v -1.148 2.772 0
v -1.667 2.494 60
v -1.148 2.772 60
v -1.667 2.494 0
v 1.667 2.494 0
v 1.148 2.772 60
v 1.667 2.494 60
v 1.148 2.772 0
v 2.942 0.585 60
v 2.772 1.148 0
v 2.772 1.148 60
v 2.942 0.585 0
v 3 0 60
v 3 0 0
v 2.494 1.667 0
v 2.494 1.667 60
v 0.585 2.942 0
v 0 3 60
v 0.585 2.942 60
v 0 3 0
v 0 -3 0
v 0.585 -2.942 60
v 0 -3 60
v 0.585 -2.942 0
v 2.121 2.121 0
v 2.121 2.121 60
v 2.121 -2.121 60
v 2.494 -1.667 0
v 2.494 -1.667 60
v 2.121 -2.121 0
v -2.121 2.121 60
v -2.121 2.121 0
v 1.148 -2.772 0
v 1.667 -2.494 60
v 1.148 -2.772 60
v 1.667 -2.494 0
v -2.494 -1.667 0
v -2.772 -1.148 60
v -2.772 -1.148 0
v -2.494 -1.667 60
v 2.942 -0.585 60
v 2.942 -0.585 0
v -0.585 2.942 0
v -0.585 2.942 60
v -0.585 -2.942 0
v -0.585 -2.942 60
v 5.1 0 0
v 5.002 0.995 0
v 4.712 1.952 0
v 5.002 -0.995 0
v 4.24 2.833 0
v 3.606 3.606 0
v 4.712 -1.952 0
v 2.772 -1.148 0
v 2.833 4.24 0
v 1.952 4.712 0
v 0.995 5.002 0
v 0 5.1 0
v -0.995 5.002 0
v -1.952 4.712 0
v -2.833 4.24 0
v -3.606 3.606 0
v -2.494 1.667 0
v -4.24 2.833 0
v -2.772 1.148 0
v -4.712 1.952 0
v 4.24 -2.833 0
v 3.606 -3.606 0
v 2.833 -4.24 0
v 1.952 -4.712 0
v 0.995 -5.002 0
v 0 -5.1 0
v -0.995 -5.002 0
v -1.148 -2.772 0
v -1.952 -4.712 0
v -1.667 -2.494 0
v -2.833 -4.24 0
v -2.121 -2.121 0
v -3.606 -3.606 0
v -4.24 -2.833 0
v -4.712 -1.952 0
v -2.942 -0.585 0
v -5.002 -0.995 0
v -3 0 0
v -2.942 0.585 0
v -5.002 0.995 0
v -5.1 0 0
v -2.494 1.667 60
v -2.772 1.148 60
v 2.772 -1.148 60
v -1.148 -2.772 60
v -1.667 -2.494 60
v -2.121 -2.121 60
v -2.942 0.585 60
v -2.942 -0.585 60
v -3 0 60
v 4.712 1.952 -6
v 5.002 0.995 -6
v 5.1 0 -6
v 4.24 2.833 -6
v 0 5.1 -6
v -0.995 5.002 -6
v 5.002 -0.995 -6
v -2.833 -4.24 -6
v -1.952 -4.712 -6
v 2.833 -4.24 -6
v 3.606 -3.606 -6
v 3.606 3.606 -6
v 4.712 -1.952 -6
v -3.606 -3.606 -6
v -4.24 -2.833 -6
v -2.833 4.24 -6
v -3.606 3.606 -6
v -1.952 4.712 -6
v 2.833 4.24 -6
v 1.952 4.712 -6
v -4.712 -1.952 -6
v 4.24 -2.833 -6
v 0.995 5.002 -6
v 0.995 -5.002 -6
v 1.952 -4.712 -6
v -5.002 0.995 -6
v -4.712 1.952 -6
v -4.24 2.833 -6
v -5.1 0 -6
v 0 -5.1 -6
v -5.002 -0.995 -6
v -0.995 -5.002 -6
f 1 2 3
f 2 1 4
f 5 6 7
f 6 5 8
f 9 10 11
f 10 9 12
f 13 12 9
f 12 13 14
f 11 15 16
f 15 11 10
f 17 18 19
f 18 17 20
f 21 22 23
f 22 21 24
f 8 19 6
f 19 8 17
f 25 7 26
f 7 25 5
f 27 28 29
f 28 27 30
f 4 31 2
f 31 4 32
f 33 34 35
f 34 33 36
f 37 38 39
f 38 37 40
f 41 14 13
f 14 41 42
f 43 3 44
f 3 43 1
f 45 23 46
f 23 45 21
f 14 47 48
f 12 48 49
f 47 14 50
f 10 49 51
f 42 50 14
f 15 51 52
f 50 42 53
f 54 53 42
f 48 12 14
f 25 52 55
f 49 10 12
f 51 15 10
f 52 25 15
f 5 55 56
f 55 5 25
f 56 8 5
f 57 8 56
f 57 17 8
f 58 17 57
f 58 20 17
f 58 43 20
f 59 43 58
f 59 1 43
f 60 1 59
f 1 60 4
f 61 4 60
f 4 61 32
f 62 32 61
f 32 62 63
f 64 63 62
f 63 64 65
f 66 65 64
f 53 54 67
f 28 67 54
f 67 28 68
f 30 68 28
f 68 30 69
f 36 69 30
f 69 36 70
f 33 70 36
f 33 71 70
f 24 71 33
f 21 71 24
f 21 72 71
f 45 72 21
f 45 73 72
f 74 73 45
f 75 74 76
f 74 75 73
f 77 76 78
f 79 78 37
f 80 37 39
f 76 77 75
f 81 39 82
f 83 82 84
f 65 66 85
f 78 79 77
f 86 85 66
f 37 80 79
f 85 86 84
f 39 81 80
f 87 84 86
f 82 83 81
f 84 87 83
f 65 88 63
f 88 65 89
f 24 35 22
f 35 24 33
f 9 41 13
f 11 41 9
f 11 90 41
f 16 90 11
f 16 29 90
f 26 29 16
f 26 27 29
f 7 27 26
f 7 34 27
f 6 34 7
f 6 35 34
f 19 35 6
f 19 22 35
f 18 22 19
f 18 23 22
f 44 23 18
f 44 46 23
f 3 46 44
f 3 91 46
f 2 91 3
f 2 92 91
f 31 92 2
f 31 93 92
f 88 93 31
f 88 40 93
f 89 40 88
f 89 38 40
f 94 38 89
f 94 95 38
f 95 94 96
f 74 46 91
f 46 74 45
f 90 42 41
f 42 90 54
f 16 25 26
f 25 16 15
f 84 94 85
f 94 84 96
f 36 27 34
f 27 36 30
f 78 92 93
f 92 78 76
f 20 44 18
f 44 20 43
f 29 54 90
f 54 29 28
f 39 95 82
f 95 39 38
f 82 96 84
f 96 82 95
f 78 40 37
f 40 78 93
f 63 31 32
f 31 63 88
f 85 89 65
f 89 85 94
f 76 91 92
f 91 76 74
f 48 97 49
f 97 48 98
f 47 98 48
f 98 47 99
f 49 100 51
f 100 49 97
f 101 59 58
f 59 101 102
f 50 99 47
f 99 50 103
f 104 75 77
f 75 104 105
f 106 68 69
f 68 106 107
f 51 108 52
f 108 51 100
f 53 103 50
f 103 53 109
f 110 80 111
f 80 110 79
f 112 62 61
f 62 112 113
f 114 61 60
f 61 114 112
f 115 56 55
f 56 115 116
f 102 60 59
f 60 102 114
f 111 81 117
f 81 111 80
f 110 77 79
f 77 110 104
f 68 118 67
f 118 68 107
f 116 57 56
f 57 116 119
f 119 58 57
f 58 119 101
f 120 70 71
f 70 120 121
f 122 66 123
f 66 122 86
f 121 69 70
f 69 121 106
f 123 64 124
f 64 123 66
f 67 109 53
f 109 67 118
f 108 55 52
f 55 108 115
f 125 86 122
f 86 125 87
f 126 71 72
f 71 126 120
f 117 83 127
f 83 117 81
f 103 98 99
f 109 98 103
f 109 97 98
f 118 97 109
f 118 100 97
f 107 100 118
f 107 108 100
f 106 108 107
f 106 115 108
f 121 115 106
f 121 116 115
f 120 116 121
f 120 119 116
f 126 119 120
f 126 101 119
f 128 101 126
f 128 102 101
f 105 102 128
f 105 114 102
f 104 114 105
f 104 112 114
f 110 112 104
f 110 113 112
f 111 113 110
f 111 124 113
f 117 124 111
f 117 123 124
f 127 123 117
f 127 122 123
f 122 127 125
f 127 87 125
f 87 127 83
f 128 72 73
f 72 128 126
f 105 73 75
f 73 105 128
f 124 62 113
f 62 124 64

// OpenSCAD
// Purchased hardware envelope; no modeled threads, not print.
$fn=32;
union(){cylinder(d=6,h=60);translate([0,0,-6])cylinder(d=10.2,h=6);}
